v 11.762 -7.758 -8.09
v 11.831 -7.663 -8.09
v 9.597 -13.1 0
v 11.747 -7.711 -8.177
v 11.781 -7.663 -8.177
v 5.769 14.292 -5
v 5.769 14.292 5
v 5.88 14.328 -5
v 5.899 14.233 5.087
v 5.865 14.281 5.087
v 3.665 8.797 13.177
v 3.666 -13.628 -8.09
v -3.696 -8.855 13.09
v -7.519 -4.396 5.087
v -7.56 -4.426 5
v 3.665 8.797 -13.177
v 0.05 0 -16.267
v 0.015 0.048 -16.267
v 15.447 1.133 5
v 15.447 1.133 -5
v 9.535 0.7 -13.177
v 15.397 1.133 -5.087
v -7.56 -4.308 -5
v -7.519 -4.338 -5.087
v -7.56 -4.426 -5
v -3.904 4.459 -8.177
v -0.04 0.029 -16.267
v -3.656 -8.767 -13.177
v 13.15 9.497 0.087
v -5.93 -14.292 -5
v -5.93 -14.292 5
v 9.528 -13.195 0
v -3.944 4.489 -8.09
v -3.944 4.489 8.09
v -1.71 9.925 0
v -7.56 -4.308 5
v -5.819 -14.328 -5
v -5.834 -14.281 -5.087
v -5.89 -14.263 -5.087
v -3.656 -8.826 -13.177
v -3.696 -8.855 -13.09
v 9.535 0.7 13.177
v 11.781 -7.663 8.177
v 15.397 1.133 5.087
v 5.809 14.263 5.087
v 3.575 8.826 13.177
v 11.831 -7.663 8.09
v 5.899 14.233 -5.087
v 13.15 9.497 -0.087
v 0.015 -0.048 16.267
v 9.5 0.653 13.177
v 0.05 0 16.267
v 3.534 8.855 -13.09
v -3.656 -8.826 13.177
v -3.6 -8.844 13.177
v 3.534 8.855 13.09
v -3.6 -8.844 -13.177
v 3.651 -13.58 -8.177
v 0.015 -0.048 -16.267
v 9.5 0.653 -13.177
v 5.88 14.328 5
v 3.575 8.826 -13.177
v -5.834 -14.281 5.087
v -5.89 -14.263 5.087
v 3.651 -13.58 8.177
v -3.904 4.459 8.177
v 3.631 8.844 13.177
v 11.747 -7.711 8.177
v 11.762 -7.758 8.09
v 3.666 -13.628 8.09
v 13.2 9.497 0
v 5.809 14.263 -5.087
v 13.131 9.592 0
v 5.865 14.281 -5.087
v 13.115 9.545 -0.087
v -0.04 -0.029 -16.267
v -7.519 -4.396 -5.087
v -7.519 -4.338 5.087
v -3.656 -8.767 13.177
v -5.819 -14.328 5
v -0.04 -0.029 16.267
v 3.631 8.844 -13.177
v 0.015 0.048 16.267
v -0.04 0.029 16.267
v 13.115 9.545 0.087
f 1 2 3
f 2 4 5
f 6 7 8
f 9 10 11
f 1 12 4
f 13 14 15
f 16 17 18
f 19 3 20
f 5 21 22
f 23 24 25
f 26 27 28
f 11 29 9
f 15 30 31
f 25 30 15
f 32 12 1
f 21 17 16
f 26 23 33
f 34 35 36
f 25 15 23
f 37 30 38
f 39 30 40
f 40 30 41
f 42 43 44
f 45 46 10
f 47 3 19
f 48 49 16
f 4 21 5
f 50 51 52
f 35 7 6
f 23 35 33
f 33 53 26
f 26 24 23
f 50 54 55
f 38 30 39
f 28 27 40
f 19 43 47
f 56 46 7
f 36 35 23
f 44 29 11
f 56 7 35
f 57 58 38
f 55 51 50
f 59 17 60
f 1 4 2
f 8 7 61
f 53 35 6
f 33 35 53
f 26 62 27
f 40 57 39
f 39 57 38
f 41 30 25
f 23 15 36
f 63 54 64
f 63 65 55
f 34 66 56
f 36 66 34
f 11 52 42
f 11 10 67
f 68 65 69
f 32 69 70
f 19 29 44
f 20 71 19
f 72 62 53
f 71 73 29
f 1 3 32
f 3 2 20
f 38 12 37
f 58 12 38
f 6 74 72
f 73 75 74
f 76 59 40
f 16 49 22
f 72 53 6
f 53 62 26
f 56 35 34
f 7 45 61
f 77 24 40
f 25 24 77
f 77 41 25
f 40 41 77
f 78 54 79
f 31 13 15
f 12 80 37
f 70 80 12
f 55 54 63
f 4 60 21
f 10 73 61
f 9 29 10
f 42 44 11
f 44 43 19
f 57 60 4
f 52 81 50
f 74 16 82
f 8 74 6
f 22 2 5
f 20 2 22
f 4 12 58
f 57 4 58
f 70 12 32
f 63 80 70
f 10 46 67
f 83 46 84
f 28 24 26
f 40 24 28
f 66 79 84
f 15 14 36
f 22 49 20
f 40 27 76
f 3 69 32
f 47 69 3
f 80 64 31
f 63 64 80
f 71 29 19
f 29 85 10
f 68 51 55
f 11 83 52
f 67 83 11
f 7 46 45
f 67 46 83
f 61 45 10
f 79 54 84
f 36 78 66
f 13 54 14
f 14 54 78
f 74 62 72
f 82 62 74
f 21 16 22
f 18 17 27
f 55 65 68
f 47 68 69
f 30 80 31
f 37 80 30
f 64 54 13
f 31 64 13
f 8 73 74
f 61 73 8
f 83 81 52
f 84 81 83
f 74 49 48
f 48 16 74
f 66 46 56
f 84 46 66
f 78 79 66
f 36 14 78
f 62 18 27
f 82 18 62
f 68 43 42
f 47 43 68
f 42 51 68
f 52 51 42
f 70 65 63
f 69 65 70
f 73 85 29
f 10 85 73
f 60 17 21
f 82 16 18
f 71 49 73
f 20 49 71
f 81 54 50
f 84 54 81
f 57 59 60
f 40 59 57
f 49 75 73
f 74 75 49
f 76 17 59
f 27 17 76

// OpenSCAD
// Auto-generated OpenSCAD file

    inner_points = 10*[[1.6796923234637004e-13, 6.070021975389176e-13, -1.618033988749895], [-1.6796923234637004e-13, -6.070021975389176e-13, 1.618033988749895], [1.3099900587145907, 0.9497157652786637, 4.92274937759846e-13], [0.9497157652786637, -1.3099900587145907, -3.9284948324472034e-13], [0.948473340654347, 0.0700486920347792, -1.3090169943748227], [0.9484733406540753, 0.07004869203379704, 1.3090169943750722], [0.3615167180605155, 0.8796670732448667, -1.3090169943745797], [0.36151671806024377, 0.8796670732438845, 1.3090169943753152], [-0.36151671806024377, -0.8796670732438845, -1.3090169943753152], [-0.3615167180605155, -0.8796670732448667, 1.3090169943745797], [1.5346621026017229, 0.11334116457913979, -0.49999999999979816], [1.5346621026016192, 0.11334116457876464, 0.5000000000002018], [0.5849463373230591, 1.4233312232937305, -0.49999999999940536], [0.5849463373229553, 1.4233312232933555, 0.5000000000005946], [-0.5849463373229553, -1.4233312232933555, -0.5000000000005946], [-0.5849463373230591, -1.4233312232937305, 0.49999999999940536], [1.173145384541375, -0.7663259086651197, -0.8090169943751132], [1.1731453845412072, -0.766325908665727, 0.8090169943747817], [0.36352700333128773, -1.3532825312589511, -0.8090169943754174], [0.36352700333111987, -1.3532825312595584, 0.8090169943744775], [-0.1629176159415796, 0.9866396760803366, 3.5322329978742213e-13], [-0.7478639532645349, -0.4366915472130185, -0.5000000000002415], [-0.7478639532646387, -0.4366915472133937, 0.4999999999997586], [-0.3863472352041232, 0.4429755260314729, -0.8090169943748214], [-0.38634723520429115, 0.44297552603086593, 0.8090169943750735]];

    outer_points = 10*[[0.3292875792170331, 0.6516523075520398, 1.4439366152935462], [-0.3292875792170331, -0.6516523075520398, -1.4439366152935462], [1.5775331980706784, 0.0, -0.35975407952487837], [-0.14488853615168673, 1.4810075147722905, -0.6353408864772672], [1.0103928266975255, 0.9848542820948938, 0.7919610896675606], [0.4775943314511925, -0.06954130037160627, -1.5443774314778784], [1.0999388666194858, 0.06954130037160627, 1.184623351953], [0.5671403713731528, -0.9848542820948938, -1.151715169192439], [-0.5671403713731528, 0.9848542820948938, 1.151715169192439], [-1.0999388666194858, -0.06954130037160627, -1.184623351953], [1.3055623563686454, 0.9418753948433755, -0.16251665444403007], [1.1020514403393455, 0.5391321199289151, -1.0549185602959228], [1.450450892520332, -0.5391321199289151, 0.4728242320332371], [1.2469399764910323, -0.9418753948433755, -0.41957767381865574], [-1.2469399764910323, 0.9418753948433755, 0.41957767381865574], [-1.450450892520332, 0.5391321199289151, -0.4728242320332371], [0.5349110689661927, 1.523986402023809, 0.09679660889651609], [0.20562348974915956, 0.8723340944717692, -1.34714000639703], [-0.4400580658228066, 1.523986402023809, 0.31913685763432353], [-0.7693456450398397, 0.8723340944717692, -1.1247997576592228], [0.5161118652230368, -0.8186808191285174, 0.25177422220524803], [-0.7308281112679954, 0.12319457571485803, 0.6713518960239038], [-0.9343390272972953, -0.27954869919960235, -0.22105000982798903], [0.16559983932219047, -0.21000739882799596, 0.9635733421250111], [-0.16368773989484264, -0.8616597063800358, -0.48036327316853505]];

    // Convex hull for inner set (I)
    module inner_hull() {
        hull() {
            for (p = inner_points) {
                translate(p) sphere(r=0.1);
            }
        }
    }

    // Convex hull for outer set (O) minus inner hull (O \ I)
    module outer_minus_inner() {
        difference() {
            hull() {
                for (p = outer_points) {
                    translate(p) sphere(r=0.1);
                }
            }
            inner_hull(); // Subtract inner hull
        }
    }

    // Convex hull for outer set (O) minus all translated inner hulls
    module outer_minus_AllTranslationInner() {
        difference() {
            hull() {
                for (p = outer_points) {
                    translate(p) sphere(r=0.1);
                }
            }
            hull() {
                translate([0,0,50]) inner_hull();
                translate([0,0,-50]) inner_hull();
            }; // Subtract translated inner hulls
        }
    }

    // Difference between outer_minus_inner and outer_minus_AllTranslationInner
    module outer_minus_inner_diff() {
        difference() {
            // Outer minus inner
            difference() {
                hull() {
                    for (p = outer_points) {
                        translate(p) sphere(r=0.1);
                    }
                }
                inner_hull();
            }

            // Subtract Outer minus AllTranslationInner
            difference() {
                hull() {
                    for (p = outer_points) {
                        translate(p) sphere(r=0.1);
                    }
                }
                hull() {
                    translate([0,0,50]) inner_hull();
                    translate([0,0,-50]) inner_hull();
                };
            }
        }
    }

    // Rendering all with colors applied
    color([1, 0, 0, 0.5]) inner_hull(); // Transparent red
    
